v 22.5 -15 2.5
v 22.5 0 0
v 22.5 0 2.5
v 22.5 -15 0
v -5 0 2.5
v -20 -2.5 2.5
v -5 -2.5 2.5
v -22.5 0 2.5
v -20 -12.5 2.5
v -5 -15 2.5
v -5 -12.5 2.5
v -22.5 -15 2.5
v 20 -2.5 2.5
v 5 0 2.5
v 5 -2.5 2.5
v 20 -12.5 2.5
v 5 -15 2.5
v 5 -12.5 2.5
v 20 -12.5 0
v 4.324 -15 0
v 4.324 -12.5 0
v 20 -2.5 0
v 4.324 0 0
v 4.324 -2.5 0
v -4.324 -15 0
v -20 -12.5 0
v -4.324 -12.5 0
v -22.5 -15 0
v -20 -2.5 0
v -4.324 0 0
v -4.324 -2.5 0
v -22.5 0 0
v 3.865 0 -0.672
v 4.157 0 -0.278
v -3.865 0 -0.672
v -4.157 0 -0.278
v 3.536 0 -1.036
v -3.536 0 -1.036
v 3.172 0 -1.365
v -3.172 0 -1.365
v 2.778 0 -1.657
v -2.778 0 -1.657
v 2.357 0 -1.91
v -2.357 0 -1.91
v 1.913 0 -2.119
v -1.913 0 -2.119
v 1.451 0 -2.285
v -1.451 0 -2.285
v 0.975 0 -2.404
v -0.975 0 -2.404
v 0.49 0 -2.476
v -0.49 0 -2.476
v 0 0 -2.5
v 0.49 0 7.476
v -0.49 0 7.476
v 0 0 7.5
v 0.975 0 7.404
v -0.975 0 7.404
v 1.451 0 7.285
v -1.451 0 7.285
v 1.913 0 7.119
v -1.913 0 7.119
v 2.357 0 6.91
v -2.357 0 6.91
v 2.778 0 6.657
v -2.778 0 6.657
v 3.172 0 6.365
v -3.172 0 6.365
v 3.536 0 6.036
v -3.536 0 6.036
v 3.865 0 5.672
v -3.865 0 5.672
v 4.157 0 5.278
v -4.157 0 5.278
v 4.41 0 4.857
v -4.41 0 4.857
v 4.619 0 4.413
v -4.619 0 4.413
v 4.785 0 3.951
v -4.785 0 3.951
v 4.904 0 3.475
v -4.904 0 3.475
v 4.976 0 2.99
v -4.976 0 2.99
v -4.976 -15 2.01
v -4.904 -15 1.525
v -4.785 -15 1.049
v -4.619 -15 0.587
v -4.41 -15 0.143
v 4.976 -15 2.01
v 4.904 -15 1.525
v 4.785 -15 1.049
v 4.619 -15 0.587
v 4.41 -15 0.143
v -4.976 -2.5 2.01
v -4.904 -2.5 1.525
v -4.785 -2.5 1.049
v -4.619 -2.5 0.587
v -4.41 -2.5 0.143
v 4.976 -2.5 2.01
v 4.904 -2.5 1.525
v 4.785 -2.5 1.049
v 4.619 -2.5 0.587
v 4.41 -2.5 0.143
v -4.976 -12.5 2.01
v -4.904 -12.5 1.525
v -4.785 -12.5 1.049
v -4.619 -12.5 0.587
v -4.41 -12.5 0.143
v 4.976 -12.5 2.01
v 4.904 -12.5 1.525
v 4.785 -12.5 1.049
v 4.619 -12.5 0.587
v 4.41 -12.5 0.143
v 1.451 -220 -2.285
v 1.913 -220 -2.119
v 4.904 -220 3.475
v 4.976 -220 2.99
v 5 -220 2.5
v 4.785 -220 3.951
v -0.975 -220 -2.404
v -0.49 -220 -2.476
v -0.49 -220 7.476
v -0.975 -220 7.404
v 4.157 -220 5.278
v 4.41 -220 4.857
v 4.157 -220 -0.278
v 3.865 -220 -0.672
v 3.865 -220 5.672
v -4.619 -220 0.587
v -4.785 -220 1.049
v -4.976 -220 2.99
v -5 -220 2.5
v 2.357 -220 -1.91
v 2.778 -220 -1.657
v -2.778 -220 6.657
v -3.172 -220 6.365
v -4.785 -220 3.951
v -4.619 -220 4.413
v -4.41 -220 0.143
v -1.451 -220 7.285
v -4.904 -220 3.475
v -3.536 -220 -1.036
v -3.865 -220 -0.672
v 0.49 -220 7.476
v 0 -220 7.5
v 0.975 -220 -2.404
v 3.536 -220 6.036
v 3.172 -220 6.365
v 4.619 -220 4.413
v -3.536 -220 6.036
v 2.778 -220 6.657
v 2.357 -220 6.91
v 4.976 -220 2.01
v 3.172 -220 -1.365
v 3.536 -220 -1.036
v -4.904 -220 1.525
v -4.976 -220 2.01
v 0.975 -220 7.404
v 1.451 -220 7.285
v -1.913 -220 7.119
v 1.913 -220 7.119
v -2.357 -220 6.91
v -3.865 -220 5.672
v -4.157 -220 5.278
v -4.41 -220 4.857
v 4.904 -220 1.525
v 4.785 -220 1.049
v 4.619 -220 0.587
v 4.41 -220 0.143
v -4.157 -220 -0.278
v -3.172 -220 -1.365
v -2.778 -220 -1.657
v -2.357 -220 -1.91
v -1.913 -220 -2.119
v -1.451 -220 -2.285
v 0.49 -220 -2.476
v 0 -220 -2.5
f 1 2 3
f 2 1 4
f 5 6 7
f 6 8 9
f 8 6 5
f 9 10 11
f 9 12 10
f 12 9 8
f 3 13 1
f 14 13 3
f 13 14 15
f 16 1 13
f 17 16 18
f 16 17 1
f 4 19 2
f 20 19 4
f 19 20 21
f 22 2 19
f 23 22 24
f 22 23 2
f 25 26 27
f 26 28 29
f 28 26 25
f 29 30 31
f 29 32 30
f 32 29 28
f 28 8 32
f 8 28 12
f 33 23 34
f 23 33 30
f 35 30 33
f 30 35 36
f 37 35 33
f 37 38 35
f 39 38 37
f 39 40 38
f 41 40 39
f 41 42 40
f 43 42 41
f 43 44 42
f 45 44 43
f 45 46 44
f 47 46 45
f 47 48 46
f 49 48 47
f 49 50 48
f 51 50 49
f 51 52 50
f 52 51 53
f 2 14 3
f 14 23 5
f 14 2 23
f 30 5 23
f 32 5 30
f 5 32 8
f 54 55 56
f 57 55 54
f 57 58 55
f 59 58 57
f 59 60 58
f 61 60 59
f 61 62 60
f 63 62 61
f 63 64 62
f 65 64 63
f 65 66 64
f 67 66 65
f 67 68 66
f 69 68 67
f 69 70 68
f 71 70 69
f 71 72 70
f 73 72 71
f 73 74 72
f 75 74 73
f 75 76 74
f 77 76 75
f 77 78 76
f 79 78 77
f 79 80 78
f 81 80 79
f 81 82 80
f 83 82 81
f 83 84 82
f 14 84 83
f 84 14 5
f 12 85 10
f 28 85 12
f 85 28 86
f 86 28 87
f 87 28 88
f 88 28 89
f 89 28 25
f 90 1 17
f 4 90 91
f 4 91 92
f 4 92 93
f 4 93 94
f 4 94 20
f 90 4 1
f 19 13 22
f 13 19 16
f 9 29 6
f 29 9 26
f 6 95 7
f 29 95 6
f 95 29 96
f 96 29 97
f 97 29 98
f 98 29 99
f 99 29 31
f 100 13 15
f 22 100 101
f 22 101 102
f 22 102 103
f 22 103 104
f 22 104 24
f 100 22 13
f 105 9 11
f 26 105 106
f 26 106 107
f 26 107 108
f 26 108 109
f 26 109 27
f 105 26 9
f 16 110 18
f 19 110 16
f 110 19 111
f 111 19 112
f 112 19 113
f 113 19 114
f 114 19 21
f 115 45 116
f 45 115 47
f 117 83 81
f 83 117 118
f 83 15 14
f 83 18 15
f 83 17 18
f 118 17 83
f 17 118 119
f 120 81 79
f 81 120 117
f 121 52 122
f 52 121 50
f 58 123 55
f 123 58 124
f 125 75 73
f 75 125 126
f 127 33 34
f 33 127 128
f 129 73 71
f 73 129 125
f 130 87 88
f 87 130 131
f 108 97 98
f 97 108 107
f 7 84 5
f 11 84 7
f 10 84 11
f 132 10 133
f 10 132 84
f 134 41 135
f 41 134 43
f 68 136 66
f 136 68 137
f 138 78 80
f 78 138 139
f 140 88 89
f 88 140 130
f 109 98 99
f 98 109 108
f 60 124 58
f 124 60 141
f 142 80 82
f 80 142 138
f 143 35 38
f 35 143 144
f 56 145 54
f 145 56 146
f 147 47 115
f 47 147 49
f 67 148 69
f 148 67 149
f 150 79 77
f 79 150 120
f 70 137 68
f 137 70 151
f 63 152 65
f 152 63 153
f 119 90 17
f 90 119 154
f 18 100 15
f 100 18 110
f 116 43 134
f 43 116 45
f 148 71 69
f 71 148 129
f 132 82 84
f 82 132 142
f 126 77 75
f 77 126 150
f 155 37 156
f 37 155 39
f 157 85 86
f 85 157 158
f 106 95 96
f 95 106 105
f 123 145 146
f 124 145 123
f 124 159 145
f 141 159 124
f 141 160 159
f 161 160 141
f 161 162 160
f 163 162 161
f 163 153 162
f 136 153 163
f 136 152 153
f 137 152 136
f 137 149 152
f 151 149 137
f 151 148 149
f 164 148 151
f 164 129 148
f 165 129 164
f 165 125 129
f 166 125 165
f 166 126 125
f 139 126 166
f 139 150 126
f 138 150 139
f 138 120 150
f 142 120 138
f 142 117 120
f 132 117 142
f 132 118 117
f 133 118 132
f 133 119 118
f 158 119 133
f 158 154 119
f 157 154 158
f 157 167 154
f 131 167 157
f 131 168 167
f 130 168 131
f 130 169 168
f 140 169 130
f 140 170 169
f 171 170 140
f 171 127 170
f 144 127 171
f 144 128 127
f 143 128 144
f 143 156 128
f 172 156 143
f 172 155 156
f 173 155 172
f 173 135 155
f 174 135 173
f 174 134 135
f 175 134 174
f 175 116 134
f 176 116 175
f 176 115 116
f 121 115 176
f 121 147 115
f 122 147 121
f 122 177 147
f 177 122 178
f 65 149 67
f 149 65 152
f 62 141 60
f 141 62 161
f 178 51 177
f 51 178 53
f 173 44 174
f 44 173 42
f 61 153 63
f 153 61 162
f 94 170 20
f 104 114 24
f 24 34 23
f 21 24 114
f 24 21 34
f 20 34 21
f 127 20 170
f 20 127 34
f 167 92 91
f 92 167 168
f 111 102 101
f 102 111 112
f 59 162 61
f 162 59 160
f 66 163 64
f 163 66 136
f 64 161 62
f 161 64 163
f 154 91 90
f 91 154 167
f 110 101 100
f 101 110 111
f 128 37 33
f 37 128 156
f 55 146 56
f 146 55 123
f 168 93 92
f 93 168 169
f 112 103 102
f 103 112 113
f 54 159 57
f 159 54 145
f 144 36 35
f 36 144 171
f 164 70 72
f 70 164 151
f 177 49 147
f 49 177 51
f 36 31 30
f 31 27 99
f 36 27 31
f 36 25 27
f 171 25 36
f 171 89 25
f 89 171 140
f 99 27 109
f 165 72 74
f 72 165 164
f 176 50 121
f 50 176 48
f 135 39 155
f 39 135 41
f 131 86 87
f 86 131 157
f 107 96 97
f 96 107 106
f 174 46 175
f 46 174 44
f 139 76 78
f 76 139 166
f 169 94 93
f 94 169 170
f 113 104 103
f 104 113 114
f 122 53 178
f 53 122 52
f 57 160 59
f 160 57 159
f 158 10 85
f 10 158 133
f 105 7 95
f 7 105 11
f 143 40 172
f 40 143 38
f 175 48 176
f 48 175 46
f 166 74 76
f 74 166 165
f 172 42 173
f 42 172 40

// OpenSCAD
// Duckweed scooper - parametric design
// TODO: explore mechanical variant in future

handle_length = 220; // mm
handle_diameter = 10; // mm
scooper_width = 45; // mm
scooper_depth = 15; // mm
wall_thickness = 2.5; // mm

module handle() {
    cylinder(h = handle_length, r = handle_diameter / 2, $fn = 64);
}

module scooper_head() {
    difference() {
        cube([scooper_width, scooper_depth, wall_thickness]);
        translate([wall_thickness, wall_thickness, 0])
            cube([scooper_width - 2 * wall_thickness,
                  scooper_depth - 2 * wall_thickness,
                  wall_thickness]);
    }
}

translate([0, 0, wall_thickness]) rotate([90, 0, 0]) handle();
translate([-scooper_width / 2, -scooper_depth, 0]) scooper_head();
